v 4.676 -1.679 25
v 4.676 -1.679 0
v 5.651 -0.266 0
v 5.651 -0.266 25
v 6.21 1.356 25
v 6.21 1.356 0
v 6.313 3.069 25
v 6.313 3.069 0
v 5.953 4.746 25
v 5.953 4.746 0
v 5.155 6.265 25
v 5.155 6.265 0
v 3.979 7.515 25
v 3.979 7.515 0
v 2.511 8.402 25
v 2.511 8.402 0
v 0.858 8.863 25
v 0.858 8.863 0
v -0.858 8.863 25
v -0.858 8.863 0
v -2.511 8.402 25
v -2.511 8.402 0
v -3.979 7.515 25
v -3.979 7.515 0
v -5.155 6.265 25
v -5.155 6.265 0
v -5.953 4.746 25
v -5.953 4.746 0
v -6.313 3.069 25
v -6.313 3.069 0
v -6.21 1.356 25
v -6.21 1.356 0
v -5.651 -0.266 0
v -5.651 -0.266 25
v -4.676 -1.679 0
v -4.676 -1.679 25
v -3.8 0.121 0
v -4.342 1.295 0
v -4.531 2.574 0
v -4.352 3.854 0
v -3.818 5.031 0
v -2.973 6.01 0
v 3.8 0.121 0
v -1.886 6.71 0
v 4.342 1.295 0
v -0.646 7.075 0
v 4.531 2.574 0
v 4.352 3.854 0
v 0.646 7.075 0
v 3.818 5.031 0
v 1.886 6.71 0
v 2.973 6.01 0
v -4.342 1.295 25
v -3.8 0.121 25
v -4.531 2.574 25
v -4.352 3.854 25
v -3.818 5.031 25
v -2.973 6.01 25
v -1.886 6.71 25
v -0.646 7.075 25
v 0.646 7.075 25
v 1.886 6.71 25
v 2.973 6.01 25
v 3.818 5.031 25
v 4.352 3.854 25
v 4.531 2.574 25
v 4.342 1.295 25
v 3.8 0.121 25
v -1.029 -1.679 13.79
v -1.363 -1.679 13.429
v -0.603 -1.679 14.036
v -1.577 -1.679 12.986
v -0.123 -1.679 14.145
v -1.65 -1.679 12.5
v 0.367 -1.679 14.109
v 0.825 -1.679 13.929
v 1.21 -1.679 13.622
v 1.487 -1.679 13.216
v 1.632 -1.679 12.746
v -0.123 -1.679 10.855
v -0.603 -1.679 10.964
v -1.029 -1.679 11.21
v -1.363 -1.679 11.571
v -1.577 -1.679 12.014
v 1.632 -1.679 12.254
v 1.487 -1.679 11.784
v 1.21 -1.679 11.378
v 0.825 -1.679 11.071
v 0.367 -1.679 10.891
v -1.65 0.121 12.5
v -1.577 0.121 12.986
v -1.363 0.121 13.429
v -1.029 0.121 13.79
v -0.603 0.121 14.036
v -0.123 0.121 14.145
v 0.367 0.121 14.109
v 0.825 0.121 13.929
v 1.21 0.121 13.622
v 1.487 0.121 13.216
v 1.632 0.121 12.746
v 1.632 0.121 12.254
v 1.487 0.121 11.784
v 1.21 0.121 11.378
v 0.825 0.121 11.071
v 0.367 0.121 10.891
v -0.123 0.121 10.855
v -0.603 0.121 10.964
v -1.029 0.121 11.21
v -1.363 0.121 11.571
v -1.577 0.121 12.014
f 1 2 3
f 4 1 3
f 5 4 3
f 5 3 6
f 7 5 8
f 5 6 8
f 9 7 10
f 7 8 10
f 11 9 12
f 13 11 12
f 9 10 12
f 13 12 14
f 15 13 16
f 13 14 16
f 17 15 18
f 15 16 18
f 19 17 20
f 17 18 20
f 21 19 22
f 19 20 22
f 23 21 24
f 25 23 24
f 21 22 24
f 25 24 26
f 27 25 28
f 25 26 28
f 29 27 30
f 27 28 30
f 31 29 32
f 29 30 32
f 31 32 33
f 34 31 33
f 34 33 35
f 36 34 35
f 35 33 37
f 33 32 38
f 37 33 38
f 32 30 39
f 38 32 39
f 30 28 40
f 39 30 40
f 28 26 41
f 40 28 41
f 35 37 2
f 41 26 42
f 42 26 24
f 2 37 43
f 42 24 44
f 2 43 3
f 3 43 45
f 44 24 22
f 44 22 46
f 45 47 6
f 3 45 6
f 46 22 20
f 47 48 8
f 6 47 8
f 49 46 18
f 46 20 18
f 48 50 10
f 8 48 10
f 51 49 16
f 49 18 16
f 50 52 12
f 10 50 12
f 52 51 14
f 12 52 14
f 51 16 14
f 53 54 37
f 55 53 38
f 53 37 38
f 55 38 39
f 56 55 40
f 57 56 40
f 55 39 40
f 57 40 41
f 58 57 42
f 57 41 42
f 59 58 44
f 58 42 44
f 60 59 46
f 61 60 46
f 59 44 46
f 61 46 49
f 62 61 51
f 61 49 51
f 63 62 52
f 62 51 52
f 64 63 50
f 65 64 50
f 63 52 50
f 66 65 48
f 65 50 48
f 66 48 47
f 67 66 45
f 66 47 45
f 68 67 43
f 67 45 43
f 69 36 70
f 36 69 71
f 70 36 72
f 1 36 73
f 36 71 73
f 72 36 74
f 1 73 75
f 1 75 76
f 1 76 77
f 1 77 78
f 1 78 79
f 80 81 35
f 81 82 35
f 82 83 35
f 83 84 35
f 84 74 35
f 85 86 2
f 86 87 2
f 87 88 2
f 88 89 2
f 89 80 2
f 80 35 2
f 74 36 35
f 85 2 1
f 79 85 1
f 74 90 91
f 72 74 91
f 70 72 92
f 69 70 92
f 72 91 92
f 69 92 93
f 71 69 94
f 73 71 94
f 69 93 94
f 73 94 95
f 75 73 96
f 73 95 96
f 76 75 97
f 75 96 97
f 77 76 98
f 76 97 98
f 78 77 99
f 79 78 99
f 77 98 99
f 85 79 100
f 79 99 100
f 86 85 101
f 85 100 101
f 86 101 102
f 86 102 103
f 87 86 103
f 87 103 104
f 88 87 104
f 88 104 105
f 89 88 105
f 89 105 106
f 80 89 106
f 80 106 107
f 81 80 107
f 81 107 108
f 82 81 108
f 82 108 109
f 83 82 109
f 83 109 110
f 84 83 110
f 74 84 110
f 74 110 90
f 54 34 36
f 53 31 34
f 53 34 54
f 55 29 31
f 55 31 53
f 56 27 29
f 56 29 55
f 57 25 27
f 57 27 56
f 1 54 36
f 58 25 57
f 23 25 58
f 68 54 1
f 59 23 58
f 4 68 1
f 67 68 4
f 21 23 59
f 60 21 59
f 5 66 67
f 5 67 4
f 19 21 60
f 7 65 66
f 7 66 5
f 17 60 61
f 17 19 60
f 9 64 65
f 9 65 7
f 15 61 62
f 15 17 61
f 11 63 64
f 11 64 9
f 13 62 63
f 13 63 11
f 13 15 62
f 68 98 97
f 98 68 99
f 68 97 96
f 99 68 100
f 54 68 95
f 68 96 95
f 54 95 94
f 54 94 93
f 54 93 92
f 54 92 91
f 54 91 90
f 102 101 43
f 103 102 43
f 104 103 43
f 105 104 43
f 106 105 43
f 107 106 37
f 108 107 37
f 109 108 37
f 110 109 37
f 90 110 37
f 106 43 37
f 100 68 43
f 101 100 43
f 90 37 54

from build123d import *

# Parameters (mm, degrees)
F1_DEPTH = 25
F3_D     = 3.3
F3_DEPTH = 2
F3_TIP   = 0.9914200214


with BuildPart() as f1:
    # F0 (on Top) → F1 (new body)
    with BuildSketch(Plane.XY):
        with BuildLine():
            Line((-4.6761400443, -1.6786290068), (4.6761400443, -1.6786290068))
            ThreePointArc((4.6761400443, -1.6786290068), (0, 8.9213709932), (-4.6761400443, -1.6786290068))
        make_face()
        with BuildLine():
            Line((3.8, 0.1213709932), (-3.8, 0.1213709932))
            ThreePointArc((-3.8, 0.1213709932), (0, 7.1213709932), (3.8, 0.1213709932))
        make_face(mode=Mode.SUBTRACT)
    extrude(amount=F1_DEPTH)

    # F3
    with Locations(Plane.XZ.offset(1.6786290068)):
        with Locations((0, 12.5)):
            Hole(F3_D / 2, depth=F3_DEPTH)
            with Locations((0, 0, -(F3_DEPTH + F3_TIP / 2))):  # 118° drill point
                Cone(0, F3_D / 2, F3_TIP, mode=Mode.SUBTRACT)


solid = f1.part
